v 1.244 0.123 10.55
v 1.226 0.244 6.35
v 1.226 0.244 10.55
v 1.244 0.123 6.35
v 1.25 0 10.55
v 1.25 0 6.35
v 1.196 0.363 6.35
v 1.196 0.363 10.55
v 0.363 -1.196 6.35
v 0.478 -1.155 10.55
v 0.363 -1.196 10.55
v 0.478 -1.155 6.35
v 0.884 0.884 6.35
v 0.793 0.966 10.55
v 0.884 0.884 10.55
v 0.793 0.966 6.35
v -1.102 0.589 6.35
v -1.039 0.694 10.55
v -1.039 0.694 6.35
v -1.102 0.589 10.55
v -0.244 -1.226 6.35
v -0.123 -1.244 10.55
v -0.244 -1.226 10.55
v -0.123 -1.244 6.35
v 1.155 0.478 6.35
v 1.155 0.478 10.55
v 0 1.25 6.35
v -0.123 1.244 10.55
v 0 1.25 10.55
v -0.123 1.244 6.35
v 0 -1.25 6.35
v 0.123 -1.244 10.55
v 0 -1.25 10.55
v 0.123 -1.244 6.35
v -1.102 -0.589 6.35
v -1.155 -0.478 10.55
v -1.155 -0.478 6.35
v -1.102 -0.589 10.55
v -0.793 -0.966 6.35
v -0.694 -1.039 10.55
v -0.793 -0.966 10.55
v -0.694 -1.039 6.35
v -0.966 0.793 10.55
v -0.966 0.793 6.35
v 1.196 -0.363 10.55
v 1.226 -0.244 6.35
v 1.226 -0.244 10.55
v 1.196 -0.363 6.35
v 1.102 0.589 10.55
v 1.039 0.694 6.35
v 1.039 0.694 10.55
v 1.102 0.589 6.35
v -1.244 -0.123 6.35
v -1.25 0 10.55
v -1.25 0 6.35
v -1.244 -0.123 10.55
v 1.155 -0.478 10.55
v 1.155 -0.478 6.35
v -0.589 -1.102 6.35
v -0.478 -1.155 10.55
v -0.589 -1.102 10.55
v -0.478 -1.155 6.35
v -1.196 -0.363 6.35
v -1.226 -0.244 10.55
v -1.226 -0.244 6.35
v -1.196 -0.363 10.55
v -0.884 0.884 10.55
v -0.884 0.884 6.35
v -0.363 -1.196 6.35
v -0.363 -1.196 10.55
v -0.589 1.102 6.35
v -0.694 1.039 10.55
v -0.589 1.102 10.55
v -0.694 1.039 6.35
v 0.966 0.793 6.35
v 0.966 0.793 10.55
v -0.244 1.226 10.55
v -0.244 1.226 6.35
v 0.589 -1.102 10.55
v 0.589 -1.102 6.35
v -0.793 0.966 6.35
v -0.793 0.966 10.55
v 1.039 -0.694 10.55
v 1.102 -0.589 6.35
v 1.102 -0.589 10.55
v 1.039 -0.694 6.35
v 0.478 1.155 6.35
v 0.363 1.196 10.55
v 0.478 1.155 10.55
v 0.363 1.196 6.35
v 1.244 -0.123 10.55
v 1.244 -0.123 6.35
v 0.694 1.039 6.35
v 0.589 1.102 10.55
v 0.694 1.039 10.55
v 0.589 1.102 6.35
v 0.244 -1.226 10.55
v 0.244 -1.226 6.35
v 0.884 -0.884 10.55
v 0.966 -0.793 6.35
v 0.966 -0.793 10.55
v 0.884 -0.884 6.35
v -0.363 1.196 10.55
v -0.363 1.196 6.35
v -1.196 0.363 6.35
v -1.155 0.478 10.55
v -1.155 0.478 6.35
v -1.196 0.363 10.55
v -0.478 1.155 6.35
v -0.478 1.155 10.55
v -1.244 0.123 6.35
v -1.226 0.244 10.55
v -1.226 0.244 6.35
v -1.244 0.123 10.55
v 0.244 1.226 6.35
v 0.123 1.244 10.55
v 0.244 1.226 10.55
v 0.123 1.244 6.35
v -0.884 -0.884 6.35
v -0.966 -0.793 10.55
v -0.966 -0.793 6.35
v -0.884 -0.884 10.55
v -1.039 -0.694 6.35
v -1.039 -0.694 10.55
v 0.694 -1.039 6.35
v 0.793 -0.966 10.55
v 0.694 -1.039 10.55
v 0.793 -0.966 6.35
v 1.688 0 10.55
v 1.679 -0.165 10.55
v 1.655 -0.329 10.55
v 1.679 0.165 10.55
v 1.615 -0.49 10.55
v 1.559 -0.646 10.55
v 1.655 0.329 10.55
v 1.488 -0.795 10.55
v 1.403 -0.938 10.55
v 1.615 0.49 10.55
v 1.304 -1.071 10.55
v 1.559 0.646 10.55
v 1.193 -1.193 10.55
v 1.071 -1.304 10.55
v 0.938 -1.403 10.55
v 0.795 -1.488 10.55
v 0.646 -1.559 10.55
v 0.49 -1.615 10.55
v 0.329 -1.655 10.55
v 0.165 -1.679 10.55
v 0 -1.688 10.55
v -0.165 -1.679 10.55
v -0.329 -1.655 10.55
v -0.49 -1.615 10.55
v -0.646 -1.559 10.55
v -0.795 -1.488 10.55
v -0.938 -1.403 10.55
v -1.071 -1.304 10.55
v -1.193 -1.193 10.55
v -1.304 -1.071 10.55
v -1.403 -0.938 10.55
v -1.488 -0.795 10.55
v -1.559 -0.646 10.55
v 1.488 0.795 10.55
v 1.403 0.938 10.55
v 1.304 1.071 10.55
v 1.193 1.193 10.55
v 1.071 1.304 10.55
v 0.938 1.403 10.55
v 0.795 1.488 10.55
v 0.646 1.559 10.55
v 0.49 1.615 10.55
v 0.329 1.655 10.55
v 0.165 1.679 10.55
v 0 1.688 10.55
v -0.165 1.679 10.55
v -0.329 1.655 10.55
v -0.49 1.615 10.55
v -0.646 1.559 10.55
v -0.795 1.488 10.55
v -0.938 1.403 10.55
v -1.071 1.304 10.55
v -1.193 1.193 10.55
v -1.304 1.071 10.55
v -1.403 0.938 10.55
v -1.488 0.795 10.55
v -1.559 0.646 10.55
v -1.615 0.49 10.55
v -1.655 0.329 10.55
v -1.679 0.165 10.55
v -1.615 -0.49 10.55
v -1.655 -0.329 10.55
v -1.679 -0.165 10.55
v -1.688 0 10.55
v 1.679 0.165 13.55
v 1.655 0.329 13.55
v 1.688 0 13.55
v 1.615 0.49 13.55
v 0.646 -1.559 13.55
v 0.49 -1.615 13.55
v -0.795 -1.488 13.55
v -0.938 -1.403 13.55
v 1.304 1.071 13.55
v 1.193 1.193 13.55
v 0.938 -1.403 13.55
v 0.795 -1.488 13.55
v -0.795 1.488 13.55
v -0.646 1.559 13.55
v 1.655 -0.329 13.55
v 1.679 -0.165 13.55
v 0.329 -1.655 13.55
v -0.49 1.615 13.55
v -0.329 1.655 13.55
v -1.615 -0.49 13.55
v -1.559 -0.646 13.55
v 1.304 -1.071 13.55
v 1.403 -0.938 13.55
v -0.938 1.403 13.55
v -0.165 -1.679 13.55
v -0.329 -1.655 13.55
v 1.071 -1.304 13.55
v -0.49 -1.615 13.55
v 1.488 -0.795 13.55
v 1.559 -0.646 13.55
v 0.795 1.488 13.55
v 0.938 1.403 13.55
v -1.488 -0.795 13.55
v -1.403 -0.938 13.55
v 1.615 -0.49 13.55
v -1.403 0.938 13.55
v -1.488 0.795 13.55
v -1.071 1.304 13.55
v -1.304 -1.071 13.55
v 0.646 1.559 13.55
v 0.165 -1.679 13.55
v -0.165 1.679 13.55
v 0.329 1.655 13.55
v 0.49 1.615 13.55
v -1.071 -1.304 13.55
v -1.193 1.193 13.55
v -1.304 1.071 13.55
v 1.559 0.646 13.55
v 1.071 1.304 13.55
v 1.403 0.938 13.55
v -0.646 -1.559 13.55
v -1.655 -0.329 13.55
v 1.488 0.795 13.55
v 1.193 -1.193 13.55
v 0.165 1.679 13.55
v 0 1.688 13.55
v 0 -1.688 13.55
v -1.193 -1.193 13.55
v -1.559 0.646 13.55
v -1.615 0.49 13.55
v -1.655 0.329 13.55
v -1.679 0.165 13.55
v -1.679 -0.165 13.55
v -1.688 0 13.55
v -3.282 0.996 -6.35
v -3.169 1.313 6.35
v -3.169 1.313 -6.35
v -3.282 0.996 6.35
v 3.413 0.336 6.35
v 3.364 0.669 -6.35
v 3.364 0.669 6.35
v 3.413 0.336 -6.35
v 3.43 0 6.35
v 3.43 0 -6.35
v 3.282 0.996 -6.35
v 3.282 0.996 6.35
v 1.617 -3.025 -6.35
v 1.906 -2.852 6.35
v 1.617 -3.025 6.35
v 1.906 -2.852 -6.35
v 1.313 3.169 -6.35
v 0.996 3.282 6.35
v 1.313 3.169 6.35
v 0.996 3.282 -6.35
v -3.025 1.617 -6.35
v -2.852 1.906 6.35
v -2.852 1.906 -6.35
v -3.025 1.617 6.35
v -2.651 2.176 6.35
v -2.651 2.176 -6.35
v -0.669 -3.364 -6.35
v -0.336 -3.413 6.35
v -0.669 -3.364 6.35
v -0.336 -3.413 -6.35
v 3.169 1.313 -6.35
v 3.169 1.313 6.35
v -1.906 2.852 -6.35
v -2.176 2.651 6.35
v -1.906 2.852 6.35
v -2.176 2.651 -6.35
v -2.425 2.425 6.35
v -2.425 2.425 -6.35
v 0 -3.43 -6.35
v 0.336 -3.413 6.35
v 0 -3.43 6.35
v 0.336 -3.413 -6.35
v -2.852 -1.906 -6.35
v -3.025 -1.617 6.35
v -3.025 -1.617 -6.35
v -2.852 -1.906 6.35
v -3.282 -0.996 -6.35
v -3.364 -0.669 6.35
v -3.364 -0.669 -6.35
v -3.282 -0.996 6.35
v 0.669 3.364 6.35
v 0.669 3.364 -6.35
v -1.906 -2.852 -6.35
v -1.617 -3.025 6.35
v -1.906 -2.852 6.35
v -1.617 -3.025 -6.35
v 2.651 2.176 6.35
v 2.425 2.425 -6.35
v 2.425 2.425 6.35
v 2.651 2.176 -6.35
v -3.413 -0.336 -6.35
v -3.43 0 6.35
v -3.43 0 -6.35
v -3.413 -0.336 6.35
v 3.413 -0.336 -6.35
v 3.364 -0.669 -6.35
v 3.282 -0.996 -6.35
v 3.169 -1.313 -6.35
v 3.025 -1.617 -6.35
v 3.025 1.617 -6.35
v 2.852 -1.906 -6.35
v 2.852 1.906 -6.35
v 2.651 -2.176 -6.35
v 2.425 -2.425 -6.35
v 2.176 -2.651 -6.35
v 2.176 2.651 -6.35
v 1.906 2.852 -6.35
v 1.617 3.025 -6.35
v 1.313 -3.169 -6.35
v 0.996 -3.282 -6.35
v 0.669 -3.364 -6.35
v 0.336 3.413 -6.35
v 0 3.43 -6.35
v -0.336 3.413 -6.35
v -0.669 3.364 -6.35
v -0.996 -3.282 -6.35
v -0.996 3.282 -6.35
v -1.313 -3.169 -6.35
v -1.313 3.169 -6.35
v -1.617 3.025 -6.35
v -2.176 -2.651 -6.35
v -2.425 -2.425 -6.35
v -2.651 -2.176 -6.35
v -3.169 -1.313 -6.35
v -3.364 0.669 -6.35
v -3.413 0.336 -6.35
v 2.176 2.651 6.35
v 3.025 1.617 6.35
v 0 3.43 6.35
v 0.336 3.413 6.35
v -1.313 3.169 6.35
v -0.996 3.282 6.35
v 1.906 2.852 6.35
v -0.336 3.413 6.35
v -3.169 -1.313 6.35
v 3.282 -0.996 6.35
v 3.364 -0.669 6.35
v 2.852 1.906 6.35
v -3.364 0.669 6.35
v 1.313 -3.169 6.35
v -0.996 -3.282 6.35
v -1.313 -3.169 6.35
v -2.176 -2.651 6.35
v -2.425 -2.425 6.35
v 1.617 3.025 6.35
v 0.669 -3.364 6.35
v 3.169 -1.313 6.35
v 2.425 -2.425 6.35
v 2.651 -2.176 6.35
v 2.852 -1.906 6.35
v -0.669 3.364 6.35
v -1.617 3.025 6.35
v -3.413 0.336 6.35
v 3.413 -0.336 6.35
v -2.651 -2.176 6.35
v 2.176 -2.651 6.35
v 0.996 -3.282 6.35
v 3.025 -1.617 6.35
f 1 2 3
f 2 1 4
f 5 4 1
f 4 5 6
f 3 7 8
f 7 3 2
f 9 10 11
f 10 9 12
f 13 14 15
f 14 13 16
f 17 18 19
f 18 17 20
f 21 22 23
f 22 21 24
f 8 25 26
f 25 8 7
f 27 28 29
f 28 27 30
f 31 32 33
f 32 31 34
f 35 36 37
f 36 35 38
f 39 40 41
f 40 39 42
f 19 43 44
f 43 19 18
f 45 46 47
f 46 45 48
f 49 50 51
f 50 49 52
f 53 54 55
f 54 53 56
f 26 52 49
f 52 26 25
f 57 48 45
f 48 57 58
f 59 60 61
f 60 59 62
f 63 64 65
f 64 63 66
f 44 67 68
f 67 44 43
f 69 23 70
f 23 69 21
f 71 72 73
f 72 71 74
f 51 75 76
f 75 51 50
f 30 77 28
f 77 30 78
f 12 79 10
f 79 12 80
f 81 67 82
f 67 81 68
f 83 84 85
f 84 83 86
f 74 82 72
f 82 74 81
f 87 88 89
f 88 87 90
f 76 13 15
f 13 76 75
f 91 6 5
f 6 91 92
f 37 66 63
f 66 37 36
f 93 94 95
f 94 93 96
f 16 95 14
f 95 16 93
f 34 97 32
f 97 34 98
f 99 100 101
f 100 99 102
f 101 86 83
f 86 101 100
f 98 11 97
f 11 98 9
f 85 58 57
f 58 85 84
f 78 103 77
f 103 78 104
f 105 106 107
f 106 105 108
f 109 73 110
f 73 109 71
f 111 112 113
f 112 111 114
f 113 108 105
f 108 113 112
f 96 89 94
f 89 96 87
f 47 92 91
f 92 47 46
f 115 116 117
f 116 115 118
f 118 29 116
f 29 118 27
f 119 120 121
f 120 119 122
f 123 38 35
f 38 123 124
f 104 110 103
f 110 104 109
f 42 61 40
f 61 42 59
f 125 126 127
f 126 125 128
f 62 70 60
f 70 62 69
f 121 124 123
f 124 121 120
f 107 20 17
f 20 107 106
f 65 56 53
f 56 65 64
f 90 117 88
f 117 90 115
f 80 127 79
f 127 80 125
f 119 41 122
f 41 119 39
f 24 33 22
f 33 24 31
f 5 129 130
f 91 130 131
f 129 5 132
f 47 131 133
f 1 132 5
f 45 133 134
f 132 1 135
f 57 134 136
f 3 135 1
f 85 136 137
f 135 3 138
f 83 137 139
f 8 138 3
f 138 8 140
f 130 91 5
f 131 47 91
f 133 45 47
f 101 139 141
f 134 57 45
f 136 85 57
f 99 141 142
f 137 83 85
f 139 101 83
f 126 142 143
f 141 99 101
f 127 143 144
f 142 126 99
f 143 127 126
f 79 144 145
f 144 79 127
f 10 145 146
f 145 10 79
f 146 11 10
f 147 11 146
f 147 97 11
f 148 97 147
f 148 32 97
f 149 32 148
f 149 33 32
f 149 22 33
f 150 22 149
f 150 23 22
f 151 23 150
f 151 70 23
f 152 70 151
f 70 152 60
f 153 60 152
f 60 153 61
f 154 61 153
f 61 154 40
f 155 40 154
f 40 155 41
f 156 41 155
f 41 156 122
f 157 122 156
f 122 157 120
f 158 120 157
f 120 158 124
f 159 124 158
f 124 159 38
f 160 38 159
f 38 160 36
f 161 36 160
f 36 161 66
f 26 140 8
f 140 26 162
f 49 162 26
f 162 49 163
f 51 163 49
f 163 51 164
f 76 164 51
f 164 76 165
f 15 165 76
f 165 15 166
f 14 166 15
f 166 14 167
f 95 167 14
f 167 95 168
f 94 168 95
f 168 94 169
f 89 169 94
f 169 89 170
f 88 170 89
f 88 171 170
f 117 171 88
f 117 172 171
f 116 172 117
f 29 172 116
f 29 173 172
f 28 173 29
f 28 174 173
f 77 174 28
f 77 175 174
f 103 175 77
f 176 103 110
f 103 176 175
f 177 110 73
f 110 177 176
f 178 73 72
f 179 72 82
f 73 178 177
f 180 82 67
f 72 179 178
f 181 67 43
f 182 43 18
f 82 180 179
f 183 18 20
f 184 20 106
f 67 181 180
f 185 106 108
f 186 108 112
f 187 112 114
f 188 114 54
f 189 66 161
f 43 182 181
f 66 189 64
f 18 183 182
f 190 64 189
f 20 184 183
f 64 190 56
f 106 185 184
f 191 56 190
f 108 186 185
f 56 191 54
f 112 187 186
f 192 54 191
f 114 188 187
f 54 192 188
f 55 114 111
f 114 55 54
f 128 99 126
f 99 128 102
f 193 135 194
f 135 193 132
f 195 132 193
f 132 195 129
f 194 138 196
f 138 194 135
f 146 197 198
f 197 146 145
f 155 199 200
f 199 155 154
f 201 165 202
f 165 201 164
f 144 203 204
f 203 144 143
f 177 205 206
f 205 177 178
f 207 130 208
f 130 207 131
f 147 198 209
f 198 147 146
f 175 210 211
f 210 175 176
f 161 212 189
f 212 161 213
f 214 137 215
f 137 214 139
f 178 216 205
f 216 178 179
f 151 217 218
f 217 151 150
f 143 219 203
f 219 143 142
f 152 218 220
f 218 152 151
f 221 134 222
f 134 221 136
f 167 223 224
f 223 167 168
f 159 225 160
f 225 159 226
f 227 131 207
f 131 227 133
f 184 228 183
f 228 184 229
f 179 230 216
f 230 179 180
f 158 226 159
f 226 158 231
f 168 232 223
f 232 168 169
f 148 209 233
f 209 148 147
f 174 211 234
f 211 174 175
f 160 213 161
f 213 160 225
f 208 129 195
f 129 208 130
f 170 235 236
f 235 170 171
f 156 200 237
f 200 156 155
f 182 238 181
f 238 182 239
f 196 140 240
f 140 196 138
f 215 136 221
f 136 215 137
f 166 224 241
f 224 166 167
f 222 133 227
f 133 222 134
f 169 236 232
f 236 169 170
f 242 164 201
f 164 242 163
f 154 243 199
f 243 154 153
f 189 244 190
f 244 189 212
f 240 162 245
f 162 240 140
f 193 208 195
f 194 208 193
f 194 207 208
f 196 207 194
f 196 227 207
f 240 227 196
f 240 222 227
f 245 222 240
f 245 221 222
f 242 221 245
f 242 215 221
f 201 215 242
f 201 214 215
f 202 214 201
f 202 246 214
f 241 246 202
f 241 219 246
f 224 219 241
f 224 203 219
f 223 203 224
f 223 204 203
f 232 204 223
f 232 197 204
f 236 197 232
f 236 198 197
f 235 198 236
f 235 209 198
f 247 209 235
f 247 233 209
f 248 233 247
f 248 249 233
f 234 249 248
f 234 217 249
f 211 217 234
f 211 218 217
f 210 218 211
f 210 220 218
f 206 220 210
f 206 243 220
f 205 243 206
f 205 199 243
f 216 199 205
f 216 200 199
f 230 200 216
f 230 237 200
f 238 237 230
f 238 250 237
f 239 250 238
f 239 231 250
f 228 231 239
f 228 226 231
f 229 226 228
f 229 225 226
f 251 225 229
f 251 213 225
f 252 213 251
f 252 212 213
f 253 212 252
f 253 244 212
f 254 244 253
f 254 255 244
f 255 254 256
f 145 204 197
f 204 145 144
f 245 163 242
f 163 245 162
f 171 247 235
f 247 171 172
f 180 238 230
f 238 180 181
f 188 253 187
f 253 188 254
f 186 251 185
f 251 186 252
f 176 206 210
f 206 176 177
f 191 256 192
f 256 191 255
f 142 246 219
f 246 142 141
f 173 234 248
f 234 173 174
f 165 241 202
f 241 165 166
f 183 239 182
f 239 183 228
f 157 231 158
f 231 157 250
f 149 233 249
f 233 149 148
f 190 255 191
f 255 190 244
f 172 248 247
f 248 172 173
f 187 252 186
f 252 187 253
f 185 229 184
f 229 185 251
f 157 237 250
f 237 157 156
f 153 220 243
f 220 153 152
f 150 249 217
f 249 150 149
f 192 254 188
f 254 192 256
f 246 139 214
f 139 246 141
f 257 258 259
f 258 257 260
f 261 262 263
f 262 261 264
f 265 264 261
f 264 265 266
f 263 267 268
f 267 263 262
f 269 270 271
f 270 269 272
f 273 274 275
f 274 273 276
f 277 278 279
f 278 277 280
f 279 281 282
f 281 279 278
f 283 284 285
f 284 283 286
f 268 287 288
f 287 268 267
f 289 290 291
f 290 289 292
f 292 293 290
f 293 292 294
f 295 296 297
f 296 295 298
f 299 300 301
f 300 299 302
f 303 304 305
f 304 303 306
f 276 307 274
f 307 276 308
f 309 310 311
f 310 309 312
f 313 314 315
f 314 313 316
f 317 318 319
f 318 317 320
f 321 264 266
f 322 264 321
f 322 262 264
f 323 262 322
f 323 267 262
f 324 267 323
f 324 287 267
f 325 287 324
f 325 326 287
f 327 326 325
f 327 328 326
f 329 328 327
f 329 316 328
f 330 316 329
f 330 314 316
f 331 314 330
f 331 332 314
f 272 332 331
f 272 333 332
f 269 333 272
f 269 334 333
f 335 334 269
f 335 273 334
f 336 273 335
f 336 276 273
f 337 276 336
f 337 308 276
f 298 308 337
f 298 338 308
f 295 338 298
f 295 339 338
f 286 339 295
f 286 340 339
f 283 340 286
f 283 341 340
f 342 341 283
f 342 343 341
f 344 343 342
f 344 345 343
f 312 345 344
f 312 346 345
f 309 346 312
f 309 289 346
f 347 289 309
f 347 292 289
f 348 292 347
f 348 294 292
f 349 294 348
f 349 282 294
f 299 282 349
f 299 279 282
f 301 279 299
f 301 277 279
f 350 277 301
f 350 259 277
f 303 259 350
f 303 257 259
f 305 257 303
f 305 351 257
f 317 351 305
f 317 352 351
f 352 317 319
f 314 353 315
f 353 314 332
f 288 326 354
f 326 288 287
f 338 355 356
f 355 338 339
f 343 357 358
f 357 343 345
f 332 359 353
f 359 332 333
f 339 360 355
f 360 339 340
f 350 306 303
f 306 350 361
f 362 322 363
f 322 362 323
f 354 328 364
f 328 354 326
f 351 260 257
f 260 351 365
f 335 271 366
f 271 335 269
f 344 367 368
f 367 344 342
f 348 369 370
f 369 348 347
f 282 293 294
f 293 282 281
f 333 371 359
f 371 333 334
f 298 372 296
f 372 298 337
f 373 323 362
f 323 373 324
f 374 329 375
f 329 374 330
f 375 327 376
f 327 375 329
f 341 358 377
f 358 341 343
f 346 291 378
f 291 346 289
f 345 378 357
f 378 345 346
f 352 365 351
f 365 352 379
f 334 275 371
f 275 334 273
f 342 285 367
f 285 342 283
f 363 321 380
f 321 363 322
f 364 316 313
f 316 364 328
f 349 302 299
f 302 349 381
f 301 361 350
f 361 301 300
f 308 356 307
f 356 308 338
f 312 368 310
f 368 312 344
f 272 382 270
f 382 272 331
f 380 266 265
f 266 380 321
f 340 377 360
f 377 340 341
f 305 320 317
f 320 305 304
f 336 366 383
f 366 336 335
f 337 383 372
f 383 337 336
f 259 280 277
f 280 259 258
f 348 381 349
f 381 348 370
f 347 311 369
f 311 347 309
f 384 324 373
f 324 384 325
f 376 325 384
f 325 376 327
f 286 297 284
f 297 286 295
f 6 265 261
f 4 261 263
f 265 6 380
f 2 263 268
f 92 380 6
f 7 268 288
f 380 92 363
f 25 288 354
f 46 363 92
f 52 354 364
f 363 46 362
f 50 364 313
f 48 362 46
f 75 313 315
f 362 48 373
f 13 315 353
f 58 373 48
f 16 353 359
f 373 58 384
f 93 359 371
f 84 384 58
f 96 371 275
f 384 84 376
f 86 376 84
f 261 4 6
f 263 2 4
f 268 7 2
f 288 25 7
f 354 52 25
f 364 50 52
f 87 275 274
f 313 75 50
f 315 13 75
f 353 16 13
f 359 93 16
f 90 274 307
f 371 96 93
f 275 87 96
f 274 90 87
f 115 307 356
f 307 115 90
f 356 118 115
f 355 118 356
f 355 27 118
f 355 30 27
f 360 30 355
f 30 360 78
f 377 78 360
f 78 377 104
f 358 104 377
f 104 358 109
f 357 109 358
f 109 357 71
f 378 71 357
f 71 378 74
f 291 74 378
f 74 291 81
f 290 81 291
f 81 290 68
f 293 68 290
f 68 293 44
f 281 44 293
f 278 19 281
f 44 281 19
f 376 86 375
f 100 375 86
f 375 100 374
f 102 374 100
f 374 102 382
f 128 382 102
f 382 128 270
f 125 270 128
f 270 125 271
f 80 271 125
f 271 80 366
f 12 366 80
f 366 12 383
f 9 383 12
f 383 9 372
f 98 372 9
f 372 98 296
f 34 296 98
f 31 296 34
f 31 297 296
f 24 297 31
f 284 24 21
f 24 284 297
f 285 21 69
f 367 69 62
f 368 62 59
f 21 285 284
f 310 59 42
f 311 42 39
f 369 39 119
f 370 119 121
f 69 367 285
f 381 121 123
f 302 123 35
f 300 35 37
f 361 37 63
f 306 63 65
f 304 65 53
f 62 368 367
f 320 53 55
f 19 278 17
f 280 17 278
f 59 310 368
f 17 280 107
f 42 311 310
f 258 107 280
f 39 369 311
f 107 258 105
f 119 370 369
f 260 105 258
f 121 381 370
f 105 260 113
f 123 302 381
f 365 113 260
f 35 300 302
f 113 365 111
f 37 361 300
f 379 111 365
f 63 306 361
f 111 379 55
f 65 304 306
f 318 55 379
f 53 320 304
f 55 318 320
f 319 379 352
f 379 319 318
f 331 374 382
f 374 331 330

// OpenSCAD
// Parameters
body_diameter_mm = 6.86; //[3.43:13.72:0.01]
body_height_mm   = 12.7; //[6.35:25.4:0.01]
centered         = 1;    //[0:1:1]
tolerance_mm     = 0;    //[0:0.5:0.01]
face_thickness_mm= 0.6;  //[0.3:1.2:0.05]
overlap_mm       = 0.8;  //[0.5:2:0.1]
lever_diameter_mm= 2.5;  //[1.5:5:0.1]
lever_height_mm  = 8;    //[4:16:0.5]
include_toggle_lever = 1; //[0:1:1]

// Resolution
$fn = 64;

// Derived
body_r = (body_diameter_mm + tolerance_mm)/2;
body_h =  body_height_mm + tolerance_mm;

// Place body so that:
// centered=1 -> centered at Z=0
// centered=0 -> bottom at Z=0
z0 = centered ? 0 : body_h/2;

// Toggle Switch Body (main cylinder)
module toggle_switch_body() {
  color("DimGray")
    translate([0,0,z0])
      cylinder(h=body_h, r=body_r, center=true);
}

// Top/Bottom thin faces (kept connected via overlap)
module top_face() {
  color("Silver")
    translate([0,0, z0 + body_h/2 - face_thickness_mm/2 - overlap_mm/2])
      cylinder(h=face_thickness_mm, r=body_r, center=true);
}

module bottom_face() {
  color("Silver")
    translate([0,0, z0 - body_h/2 + face_thickness_mm/2 + overlap_mm/2])
      cylinder(h=face_thickness_mm, r=body_r, center=true);
}

// Toggle lever: a small shaft + a thicker knob, both connected to the body
module toggle_lever() {
  if (include_toggle_lever) {
    lever_r = lever_diameter_mm/2;
    knob_r  = lever_r*1.35;
    knob_h  = max(lever_diameter_mm*1.2, 2.0);
    shaft_h = max(lever_height_mm - knob_h, 0.01);

    // Shaft starts slightly inside the body top to guarantee connection
    shaft_center_z = z0 + body_h/2 + shaft_h/2 - overlap_mm;
    knob_center_z  = z0 + body_h/2 + shaft_h + knob_h/2 - overlap_mm;

    color("Black")
      union() {
        translate([0,0,shaft_center_z])
          cylinder(h=shaft_h, r=lever_r, center=true);

        translate([0,0,knob_center_z])
          cylinder(h=knob_h, r=knob_r, center=true);
      }
  }
}

// Assembly: ONE connected solid
union() {
  toggle_switch_body();
  top_face();
  bottom_face();
  toggle_lever();
}
